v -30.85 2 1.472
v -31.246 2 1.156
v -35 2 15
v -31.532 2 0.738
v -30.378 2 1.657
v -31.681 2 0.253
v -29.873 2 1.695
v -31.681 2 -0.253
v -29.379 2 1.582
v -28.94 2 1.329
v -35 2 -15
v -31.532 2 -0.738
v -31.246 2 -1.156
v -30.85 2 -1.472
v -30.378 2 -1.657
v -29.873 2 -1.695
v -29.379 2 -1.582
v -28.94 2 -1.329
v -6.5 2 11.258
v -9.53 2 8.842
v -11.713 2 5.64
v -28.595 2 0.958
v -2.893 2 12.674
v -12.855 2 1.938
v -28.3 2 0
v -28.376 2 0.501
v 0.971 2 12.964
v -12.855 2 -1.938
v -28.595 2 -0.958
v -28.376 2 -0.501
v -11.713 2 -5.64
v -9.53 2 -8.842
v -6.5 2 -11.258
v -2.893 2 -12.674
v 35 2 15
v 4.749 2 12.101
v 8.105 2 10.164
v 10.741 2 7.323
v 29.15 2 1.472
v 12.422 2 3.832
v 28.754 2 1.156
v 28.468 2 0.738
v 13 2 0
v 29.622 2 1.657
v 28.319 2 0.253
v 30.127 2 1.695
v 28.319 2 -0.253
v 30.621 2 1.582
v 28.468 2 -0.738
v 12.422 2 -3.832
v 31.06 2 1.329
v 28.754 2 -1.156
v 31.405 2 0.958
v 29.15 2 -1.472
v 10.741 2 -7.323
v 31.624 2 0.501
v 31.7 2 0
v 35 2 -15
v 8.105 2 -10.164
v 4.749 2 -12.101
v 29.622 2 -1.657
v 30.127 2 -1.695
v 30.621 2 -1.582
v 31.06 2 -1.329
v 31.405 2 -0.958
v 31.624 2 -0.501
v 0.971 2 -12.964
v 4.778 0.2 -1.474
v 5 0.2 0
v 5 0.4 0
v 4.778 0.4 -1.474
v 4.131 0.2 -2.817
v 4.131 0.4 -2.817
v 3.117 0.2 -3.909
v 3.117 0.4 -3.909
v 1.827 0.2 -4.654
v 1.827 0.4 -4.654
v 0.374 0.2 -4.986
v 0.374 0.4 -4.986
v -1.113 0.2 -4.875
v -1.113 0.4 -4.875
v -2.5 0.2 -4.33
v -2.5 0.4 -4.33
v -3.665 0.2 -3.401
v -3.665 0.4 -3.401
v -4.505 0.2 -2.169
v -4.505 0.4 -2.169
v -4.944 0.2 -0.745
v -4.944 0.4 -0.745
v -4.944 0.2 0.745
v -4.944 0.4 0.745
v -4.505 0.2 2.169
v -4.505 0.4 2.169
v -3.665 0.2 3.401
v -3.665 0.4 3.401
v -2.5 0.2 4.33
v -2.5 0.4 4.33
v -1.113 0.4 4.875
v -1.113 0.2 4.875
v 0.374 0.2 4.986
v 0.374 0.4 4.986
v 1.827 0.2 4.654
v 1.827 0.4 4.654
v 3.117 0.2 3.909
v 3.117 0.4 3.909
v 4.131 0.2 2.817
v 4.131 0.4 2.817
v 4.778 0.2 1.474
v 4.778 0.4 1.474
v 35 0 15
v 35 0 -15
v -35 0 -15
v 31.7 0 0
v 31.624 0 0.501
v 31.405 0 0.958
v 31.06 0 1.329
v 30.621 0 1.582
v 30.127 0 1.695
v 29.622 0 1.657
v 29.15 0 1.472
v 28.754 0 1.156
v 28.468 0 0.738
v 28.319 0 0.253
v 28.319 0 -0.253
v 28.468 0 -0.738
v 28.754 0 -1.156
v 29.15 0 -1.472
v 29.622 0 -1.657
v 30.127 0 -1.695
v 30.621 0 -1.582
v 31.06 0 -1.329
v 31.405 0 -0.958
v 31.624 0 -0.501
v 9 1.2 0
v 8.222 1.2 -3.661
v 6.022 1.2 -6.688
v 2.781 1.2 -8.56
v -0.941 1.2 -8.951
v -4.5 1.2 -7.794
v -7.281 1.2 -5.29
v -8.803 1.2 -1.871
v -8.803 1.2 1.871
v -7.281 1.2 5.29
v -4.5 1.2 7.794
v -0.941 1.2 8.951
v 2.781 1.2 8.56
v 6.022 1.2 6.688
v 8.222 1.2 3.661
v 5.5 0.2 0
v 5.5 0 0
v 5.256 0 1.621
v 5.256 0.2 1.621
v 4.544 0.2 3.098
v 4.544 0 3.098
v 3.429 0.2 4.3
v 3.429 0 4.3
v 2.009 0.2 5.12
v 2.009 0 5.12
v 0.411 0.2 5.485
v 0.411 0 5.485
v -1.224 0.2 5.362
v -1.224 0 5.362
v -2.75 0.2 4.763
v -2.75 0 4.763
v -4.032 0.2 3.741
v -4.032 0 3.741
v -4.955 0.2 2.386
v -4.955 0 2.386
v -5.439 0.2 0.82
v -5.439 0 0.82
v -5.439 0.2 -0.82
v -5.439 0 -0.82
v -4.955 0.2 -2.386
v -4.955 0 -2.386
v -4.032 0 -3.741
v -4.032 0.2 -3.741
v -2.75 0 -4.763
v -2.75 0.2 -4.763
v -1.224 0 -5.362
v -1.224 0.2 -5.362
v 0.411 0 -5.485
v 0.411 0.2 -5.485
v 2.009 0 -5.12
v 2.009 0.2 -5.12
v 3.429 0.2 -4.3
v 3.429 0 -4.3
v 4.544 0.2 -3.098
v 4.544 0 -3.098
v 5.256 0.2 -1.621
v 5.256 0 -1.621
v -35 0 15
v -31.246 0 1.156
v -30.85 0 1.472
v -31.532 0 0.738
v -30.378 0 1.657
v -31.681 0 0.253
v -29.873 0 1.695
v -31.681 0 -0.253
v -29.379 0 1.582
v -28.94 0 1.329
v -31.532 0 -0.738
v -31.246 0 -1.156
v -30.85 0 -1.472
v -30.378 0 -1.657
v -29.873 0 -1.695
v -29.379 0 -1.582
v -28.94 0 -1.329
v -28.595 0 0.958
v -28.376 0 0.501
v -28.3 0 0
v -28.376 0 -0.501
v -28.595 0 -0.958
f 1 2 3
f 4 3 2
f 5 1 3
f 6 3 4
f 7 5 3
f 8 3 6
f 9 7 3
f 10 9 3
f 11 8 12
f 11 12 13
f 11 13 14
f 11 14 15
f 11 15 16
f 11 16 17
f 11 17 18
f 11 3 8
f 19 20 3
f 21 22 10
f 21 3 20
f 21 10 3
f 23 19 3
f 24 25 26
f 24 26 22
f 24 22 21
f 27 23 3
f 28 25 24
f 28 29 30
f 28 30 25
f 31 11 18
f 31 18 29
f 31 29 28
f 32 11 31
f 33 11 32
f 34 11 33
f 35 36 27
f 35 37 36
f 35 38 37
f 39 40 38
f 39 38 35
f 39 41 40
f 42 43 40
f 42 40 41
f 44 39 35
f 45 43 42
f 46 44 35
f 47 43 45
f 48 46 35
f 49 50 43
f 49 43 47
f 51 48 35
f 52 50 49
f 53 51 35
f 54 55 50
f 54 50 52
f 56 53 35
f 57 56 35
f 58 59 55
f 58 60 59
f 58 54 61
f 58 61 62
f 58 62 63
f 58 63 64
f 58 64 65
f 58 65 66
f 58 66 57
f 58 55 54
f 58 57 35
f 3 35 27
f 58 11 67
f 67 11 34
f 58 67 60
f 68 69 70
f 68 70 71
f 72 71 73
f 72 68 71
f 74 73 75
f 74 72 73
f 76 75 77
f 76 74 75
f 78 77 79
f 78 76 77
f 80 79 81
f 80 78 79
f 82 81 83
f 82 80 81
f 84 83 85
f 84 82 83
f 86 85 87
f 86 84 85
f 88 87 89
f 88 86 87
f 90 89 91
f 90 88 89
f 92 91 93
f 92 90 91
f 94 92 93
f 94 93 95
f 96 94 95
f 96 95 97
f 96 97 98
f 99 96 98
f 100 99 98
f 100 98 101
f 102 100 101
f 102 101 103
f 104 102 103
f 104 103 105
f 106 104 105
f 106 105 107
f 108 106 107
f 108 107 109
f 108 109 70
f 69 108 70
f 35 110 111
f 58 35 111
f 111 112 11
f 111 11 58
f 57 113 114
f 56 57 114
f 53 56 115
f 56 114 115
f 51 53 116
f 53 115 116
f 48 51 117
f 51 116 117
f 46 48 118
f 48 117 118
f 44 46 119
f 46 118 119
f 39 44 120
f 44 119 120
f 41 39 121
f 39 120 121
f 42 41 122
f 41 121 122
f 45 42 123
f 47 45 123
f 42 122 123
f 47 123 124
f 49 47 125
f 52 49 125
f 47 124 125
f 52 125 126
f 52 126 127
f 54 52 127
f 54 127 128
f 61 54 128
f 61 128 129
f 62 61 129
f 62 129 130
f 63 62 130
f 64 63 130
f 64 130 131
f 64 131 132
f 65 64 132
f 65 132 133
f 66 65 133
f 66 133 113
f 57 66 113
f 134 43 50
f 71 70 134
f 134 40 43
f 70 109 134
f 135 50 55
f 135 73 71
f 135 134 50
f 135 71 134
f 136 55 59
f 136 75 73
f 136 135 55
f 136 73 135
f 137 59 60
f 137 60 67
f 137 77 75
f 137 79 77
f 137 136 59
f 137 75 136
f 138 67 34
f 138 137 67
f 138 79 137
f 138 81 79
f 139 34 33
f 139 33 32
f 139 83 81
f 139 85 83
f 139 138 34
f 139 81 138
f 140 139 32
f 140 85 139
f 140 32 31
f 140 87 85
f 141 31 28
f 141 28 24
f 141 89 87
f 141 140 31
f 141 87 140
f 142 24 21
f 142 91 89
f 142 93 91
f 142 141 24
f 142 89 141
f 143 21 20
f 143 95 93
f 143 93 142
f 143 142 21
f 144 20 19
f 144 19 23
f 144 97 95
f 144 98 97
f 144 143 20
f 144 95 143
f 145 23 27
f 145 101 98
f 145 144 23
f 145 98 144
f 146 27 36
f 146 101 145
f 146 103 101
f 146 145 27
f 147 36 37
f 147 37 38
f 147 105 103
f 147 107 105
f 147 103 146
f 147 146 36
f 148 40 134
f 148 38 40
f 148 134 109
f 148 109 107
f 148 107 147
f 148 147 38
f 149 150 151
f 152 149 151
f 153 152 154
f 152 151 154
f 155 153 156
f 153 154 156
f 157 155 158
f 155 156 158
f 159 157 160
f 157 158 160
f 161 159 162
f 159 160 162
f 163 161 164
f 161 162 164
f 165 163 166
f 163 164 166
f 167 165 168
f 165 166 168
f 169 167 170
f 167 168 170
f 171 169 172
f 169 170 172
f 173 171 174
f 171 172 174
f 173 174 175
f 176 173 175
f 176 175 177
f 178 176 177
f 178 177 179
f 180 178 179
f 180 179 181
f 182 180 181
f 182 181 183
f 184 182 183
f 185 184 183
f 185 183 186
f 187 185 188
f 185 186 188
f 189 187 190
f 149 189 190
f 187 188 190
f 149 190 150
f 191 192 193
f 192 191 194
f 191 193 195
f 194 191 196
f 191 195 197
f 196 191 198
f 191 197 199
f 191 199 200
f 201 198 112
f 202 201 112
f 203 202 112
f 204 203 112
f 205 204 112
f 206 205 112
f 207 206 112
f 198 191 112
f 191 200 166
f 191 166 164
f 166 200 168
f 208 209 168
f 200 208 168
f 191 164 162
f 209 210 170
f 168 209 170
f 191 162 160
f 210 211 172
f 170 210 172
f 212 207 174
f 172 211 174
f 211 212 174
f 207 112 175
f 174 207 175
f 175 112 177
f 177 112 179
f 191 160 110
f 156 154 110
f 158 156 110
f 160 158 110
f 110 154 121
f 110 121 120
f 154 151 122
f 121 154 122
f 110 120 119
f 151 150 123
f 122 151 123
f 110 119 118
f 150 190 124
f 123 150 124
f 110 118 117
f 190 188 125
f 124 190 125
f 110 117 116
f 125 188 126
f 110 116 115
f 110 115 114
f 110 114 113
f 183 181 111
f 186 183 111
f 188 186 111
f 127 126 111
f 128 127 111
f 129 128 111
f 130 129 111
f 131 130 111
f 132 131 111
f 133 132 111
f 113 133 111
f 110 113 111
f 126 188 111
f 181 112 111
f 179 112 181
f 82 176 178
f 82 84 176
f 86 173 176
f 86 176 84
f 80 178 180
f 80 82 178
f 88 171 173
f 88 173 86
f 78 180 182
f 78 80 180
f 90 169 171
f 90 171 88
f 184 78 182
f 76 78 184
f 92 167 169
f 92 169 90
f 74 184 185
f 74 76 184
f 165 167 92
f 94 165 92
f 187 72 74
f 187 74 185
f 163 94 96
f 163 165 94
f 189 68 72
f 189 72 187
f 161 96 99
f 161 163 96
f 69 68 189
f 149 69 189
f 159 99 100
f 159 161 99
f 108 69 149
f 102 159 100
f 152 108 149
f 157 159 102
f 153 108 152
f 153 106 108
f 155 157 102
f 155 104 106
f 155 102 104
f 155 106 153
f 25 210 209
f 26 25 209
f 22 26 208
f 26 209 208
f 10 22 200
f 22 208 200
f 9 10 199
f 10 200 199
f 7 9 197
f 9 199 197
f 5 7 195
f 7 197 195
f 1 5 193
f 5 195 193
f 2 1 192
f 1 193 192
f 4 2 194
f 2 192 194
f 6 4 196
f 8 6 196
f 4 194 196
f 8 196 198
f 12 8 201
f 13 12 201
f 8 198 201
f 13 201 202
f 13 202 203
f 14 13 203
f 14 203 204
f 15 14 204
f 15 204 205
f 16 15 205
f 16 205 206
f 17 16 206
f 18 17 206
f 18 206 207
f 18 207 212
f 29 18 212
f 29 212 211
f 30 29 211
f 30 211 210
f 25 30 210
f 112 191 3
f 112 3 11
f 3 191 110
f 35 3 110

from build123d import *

# Parameters (mm, degrees)
SKETCH1_W            = 70
SKETCH1_H            = 30
SKETCH1_R            = 5
EXTRUDE1_DEPTH       = 2
CHAMFER1_SIZE        = 8
CHAMFER1_SIZE2       = 1.6
SKETCH3_R            = 5.5
CUT_EXTRUDE1_DEPTH   = 0.2
M3_CLEARANCE_HOLE1_D = 3.4


with BuildPart() as part:
    # Sketch1 → Extrude1 (new body)
    with BuildSketch(Plane(origin=(0, 0, 0), x_dir=(1, 0, 0), z_dir=(0, 1, 0))):
        Rectangle(SKETCH1_W, SKETCH1_H)
        Circle(SKETCH1_R, mode=Mode.SUBTRACT)
    extrude(amount=EXTRUDE1_DEPTH)

    # Chamfer1
    chamfer1_edges = [part.edges().sort_by_distance(p)[0] for p in [
        (-5, 2, 0),
    ]]
    chamfer1_side = [part.faces().sort_by_distance(p)[0] for p in [
        (0, 2, -14.238422689),
    ]]
    chamfer(chamfer1_edges, length=CHAMFER1_SIZE, length2=CHAMFER1_SIZE2, reference=chamfer1_side[0])

    # Sketch3 → Cut-Extrude1 (cut)
    with BuildSketch(Plane.XZ):
        Circle(SKETCH3_R)
    extrude(amount=-CUT_EXTRUDE1_DEPTH, mode=Mode.SUBTRACT)

    # M3 Clearance Hole1 (through all)
    with Locations(Plane(origin=(0, 2, 0), x_dir=(-1, 0, 0), z_dir=(0, 1, 0))):
        with Locations((-30, 0), (30, 0)):
            Hole(M3_CLEARANCE_HOLE1_D / 2)


solid = part.part
